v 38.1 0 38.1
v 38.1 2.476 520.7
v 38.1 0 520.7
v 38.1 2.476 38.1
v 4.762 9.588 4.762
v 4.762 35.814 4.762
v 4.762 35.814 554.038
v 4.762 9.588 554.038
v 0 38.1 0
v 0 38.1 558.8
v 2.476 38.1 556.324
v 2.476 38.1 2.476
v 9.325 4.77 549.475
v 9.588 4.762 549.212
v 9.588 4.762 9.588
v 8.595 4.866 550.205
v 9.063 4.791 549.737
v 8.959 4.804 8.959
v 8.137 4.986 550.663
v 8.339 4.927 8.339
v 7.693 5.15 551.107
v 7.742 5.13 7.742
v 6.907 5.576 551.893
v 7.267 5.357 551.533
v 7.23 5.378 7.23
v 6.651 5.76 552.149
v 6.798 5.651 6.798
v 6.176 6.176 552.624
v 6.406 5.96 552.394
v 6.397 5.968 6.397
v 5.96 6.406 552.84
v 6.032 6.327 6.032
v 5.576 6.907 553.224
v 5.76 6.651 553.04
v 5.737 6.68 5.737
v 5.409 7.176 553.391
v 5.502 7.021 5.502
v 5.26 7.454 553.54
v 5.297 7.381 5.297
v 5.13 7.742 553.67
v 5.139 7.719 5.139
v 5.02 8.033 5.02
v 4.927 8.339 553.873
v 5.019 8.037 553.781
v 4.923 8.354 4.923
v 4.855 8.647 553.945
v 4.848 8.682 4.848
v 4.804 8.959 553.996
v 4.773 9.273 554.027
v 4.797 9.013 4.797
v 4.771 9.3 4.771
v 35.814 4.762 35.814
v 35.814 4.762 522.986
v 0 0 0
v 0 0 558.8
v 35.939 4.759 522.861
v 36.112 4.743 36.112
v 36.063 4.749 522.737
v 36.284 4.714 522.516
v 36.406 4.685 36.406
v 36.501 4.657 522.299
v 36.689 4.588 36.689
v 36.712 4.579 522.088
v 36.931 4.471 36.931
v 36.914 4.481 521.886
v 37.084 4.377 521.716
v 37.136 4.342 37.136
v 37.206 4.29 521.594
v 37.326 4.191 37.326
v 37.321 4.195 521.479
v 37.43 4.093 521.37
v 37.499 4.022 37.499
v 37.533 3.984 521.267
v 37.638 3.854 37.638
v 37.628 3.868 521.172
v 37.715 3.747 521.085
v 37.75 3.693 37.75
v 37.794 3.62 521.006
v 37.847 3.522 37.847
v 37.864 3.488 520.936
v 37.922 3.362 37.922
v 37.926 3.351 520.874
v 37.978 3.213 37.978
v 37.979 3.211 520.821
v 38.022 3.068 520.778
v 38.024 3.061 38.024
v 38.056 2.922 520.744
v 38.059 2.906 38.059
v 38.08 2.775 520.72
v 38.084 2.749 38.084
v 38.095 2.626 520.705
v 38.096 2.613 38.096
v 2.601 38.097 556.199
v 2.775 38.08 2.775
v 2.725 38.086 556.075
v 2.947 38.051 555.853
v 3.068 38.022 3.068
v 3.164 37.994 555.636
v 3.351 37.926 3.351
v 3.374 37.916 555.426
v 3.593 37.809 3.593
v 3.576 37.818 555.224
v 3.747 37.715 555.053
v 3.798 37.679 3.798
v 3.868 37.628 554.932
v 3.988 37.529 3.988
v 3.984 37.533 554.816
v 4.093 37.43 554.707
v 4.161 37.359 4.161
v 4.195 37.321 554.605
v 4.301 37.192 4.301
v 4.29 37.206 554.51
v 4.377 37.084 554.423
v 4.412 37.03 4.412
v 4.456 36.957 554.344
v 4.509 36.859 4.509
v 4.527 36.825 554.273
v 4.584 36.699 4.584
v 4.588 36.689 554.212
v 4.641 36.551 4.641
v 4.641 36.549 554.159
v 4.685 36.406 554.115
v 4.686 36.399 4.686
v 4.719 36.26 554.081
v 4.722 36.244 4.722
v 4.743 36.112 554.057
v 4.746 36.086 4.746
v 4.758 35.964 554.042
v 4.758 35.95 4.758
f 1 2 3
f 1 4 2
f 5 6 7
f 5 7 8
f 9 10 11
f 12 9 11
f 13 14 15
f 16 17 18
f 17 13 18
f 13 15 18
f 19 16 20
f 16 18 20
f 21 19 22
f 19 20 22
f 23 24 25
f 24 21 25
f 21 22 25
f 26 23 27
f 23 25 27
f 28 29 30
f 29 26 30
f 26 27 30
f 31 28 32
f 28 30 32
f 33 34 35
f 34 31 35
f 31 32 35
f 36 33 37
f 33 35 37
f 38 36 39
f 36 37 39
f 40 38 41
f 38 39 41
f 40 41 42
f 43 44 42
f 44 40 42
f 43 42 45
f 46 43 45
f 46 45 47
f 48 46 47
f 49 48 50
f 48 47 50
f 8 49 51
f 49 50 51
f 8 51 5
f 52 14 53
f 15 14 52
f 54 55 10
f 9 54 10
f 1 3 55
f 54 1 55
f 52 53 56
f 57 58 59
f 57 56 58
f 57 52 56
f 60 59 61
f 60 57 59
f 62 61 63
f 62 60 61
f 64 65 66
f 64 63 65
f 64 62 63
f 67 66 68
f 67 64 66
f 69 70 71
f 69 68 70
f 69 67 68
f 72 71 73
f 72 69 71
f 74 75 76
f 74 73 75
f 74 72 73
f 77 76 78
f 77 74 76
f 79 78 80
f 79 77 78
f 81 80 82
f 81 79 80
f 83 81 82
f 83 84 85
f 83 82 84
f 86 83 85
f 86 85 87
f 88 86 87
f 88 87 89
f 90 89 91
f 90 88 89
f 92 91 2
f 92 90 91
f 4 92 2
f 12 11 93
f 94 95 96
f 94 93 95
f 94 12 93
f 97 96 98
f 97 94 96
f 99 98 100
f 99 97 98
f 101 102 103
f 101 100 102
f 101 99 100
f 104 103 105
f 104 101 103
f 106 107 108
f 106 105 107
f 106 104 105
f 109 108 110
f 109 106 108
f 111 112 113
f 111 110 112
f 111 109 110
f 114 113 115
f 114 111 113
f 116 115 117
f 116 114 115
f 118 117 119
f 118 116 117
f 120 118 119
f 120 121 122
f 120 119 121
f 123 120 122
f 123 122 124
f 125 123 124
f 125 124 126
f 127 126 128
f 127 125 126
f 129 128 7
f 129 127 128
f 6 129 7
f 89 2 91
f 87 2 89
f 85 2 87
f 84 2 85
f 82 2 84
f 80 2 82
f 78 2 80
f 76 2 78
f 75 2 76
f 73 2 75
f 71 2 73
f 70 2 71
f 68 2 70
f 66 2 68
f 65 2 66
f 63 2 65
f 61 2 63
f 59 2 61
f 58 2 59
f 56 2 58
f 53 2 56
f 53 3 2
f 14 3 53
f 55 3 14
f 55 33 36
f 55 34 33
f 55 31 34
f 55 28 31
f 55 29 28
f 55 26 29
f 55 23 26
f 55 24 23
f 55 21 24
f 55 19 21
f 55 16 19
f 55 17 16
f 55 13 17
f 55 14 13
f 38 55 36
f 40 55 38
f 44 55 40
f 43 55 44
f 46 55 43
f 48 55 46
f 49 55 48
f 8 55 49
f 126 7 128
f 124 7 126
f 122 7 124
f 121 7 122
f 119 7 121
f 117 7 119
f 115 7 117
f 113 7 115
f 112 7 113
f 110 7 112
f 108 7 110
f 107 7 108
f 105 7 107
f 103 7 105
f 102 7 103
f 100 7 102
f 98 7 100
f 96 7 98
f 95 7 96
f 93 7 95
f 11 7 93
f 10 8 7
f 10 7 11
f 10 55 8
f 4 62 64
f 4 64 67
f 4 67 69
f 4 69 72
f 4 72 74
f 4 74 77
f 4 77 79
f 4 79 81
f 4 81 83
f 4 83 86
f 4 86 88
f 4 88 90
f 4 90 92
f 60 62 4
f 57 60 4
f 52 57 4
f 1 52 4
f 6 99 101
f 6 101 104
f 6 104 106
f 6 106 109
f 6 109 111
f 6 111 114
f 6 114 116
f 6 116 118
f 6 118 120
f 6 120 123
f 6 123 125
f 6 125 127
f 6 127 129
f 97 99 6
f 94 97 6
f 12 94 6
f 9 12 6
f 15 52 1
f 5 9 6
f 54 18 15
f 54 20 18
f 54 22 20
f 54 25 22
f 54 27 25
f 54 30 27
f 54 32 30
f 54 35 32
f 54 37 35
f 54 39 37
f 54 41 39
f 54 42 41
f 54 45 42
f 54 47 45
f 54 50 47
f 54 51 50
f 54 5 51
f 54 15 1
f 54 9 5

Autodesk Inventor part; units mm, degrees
ref_plane "Start plane" through (0, 0, 0) normal (0, 0, 1) x (1, 0, 0)
ref_plane "End plane" through (0, 0, 558.8) normal (0, 0, 1) x (1, 0, 0)
sketch "Sketch" plane through (0, 0, 0) normal (0, 0, 1) x (1, 0, 0)
  line L0 (38.1, 0) -> (0, 0)
  line L1 (0, 0) -> (0, 38.1)
  line L2 (0, 38.1) -> (2.4765, 38.1)
  line L3 (4.7625, 35.814) -> (4.7625, 9.5885)
  line L4 (9.5885, 4.7625) -> (35.814, 4.7625)
  line L5 (38.1, 2.4765) -> (38.1, 0)
  line L6 (0, -11.0414) -> (0, 31.5385) construction
  line L7 (-11.0414, 0) -> (31.5385, 0) construction
  arc A0 (4.7625, 9.5885) -> (9.5885, 4.7625) centre (9.5885, 9.5885) ccw
  arc A1 (4.7625, 35.814) -> (2.4765, 38.1) centre (2.4765, 35.814) ccw
  arc A2 (38.1, 2.4765) -> (35.814, 4.7625) centre (35.814, 2.4765) ccw
  line L8 (0, 48.4964) -> (0, -20.9644) construction
  line L9 (-20.9644, 0) -> (48.4964, 0) construction
  point P0 (4.7625, 38.1)
  point P1 (4.7625, 4.7625)
  point P2 (38.1, 4.7625)
  dimension "d0" = 38.1
  dimension "d1" = 38.1
  dimension "d2" = 4.7625
  dimension "d3" = 4.7625
  dimension "d10" = 0
  dimension "d11" = 0
  dimension "d14" = 4.826
  dimension "d15" = 2.286
extrude "Body" add sketch "Sketch" along normal up to surface (558.8 mm away) from surface at 0
sketch "Sketch3" plane through (0, 0, 0) normal (0, 0, 1) x (1, 0, 0)
  line L0 (0, 0) -> (10, 0)
ref_plane "Work Plane3" through (0, 0, 0) normal (0, -1, 0) x (1, 0, 0)
sketch "Sketch4" plane through (0, 0, 0) normal (0, -1, 0) x (1, 0, 0)
  line L0 (-2, 0) -> (12, 0)
  line L1 (-2, 558.8) -> (12, 558.8)
  dimension "d17" = 558.8
ref_plane "Work Plane4" through (0, 19.05, 558.8) normal (0.7071, 0, 0.7071) x (0.7071, 0, -0.7071)
split "Split1" plane through (0, 19.05, 558.8) removes the side toward (0.7071, 0, 0.7071)
ref_plane "Work Plane5" through (0, 19.05, 0) normal (0.7071, 0, -0.7071) x (-0.7071, 0, -0.7071)
split "Split2" plane through (0, 19.05, 0) removes the side toward (0.7071, 0, -0.7071)
equation "\"d0\" = G_H"
equation "\"d1\" = G_H"
equation "\"d2\" = G_T"
equation "\"d3\" = G_T"
equation "\"d14\" = G_IR"
equation "\"d15\" = G_ER"
equation "\"d4\" = G_L"
equation "\"G_H\" = 38.1"
equation "\"G_T\" = 4.7625"
equation "\"G_ER\" = 2.286"
equation "\"G_IR\" = 4.826"
equation "\"G_L\" = d17"
equation "\"ex\" = 0"
equation "\"G_OFFSET_START\" = 0"
equation "\"G_OFFSET_END\" = 0"
equation "\"d13\" = G_OFFSET_END + B_L"
equation "\"B_L\" = 558.8"
properties part number "AISC - L 1.5 x 1.5 x 3/16 - 22" material "Aluminum 6061"
